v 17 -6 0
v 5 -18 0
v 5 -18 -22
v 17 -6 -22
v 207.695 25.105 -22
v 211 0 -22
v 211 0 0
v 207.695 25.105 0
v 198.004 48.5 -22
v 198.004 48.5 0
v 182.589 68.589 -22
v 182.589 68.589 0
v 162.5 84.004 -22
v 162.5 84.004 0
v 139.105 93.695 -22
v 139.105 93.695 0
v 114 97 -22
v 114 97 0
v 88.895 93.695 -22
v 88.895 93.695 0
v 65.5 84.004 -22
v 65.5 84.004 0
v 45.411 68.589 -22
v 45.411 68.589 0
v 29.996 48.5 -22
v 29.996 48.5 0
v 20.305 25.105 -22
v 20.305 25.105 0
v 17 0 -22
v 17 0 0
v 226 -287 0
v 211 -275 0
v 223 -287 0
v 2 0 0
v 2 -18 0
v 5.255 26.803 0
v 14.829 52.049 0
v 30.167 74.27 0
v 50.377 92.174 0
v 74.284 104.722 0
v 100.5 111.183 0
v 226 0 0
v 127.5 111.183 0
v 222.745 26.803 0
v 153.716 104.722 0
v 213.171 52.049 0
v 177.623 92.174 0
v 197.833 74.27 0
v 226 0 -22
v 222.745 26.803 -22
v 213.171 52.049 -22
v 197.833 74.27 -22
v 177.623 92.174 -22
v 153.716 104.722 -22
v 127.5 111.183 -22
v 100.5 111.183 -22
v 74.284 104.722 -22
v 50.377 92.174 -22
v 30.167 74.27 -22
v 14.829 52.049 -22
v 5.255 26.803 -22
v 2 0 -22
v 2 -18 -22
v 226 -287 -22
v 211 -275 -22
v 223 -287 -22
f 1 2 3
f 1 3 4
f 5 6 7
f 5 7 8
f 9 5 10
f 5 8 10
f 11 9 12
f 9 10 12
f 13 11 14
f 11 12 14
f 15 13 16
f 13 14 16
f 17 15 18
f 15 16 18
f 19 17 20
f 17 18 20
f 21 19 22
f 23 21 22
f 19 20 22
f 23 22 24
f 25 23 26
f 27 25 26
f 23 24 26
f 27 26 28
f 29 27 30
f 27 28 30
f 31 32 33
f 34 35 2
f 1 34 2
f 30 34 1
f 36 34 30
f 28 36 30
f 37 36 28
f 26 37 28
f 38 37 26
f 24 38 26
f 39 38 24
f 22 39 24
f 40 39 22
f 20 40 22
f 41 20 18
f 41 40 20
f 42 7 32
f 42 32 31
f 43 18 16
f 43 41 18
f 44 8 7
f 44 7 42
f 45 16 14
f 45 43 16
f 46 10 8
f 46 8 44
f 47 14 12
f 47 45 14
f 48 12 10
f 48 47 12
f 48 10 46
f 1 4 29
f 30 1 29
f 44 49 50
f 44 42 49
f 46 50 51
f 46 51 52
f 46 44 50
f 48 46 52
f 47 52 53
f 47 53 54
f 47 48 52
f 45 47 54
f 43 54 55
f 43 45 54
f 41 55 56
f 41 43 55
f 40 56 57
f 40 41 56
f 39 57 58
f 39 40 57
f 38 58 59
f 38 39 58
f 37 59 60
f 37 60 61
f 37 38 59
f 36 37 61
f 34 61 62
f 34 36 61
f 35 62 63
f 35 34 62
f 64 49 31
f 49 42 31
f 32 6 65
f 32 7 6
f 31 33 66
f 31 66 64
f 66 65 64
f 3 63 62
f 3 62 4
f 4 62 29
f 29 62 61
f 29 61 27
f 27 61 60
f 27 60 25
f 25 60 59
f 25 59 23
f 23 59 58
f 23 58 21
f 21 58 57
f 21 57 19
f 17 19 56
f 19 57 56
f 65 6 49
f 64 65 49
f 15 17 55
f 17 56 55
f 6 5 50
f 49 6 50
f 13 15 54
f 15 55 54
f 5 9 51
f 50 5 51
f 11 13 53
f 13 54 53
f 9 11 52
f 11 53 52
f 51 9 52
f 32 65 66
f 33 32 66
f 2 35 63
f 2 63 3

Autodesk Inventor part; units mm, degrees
ref_plane "YZ Plane" through (0, 0, 0) normal (1, 0, 0) x (0, 1, 0)
ref_plane "XZ Plane" through (0, 0, 0) normal (0, 1, 0) x (-1, 0, 0)
ref_plane "XY Plane" through (0, 0, 0) normal (0, 0, 1) x (1, 0, 0)
sketch "Sketch1" plane through (0, 0, 0) normal (0, 0, 1) x (1, 0, 0)
  line L0 (2, 0) -> (2, -17.9997) projected
  line L1 (226, 217) -> (226, -317) projected
  arc A0 (226, 0) -> (2, 0) centre (114, 0) ccw
  line L2 (2, -17.9997) -> (5, -17.9997)
  line L3 (5, -17.9997) -> (17, -5.9997)
  line L4 (17, -5.9997) -> (17, 0)
  line L5 (211, 0) -> (211, -275)
  line L6 (211, -275) -> (223, -287)
  line L7 (223, -287) -> (226, -287)
  arc A1 (211, 0) -> (17, 0) centre (114, 0) ccw
  point P0 (0, 0)
  point P1 (114, 112)
  point P2 (114, 97)
  dimension "d0" = 15
  dimension "d1" = 45
  dimension "d2" = 3
  dimension "d3" = 15
  dimension "d4" = 45
  dimension "d5" = 30
  dimension "d6" = 15
extrude "Extrusion1" add sketch "Sketch1" against normal blind 22
equation "\"d3\" = d0"
equation "\"d4\" = d1"
equation "\"d6\" = d0"
properties part number "Drag Chain Dummy" material "ABS Plastic"
